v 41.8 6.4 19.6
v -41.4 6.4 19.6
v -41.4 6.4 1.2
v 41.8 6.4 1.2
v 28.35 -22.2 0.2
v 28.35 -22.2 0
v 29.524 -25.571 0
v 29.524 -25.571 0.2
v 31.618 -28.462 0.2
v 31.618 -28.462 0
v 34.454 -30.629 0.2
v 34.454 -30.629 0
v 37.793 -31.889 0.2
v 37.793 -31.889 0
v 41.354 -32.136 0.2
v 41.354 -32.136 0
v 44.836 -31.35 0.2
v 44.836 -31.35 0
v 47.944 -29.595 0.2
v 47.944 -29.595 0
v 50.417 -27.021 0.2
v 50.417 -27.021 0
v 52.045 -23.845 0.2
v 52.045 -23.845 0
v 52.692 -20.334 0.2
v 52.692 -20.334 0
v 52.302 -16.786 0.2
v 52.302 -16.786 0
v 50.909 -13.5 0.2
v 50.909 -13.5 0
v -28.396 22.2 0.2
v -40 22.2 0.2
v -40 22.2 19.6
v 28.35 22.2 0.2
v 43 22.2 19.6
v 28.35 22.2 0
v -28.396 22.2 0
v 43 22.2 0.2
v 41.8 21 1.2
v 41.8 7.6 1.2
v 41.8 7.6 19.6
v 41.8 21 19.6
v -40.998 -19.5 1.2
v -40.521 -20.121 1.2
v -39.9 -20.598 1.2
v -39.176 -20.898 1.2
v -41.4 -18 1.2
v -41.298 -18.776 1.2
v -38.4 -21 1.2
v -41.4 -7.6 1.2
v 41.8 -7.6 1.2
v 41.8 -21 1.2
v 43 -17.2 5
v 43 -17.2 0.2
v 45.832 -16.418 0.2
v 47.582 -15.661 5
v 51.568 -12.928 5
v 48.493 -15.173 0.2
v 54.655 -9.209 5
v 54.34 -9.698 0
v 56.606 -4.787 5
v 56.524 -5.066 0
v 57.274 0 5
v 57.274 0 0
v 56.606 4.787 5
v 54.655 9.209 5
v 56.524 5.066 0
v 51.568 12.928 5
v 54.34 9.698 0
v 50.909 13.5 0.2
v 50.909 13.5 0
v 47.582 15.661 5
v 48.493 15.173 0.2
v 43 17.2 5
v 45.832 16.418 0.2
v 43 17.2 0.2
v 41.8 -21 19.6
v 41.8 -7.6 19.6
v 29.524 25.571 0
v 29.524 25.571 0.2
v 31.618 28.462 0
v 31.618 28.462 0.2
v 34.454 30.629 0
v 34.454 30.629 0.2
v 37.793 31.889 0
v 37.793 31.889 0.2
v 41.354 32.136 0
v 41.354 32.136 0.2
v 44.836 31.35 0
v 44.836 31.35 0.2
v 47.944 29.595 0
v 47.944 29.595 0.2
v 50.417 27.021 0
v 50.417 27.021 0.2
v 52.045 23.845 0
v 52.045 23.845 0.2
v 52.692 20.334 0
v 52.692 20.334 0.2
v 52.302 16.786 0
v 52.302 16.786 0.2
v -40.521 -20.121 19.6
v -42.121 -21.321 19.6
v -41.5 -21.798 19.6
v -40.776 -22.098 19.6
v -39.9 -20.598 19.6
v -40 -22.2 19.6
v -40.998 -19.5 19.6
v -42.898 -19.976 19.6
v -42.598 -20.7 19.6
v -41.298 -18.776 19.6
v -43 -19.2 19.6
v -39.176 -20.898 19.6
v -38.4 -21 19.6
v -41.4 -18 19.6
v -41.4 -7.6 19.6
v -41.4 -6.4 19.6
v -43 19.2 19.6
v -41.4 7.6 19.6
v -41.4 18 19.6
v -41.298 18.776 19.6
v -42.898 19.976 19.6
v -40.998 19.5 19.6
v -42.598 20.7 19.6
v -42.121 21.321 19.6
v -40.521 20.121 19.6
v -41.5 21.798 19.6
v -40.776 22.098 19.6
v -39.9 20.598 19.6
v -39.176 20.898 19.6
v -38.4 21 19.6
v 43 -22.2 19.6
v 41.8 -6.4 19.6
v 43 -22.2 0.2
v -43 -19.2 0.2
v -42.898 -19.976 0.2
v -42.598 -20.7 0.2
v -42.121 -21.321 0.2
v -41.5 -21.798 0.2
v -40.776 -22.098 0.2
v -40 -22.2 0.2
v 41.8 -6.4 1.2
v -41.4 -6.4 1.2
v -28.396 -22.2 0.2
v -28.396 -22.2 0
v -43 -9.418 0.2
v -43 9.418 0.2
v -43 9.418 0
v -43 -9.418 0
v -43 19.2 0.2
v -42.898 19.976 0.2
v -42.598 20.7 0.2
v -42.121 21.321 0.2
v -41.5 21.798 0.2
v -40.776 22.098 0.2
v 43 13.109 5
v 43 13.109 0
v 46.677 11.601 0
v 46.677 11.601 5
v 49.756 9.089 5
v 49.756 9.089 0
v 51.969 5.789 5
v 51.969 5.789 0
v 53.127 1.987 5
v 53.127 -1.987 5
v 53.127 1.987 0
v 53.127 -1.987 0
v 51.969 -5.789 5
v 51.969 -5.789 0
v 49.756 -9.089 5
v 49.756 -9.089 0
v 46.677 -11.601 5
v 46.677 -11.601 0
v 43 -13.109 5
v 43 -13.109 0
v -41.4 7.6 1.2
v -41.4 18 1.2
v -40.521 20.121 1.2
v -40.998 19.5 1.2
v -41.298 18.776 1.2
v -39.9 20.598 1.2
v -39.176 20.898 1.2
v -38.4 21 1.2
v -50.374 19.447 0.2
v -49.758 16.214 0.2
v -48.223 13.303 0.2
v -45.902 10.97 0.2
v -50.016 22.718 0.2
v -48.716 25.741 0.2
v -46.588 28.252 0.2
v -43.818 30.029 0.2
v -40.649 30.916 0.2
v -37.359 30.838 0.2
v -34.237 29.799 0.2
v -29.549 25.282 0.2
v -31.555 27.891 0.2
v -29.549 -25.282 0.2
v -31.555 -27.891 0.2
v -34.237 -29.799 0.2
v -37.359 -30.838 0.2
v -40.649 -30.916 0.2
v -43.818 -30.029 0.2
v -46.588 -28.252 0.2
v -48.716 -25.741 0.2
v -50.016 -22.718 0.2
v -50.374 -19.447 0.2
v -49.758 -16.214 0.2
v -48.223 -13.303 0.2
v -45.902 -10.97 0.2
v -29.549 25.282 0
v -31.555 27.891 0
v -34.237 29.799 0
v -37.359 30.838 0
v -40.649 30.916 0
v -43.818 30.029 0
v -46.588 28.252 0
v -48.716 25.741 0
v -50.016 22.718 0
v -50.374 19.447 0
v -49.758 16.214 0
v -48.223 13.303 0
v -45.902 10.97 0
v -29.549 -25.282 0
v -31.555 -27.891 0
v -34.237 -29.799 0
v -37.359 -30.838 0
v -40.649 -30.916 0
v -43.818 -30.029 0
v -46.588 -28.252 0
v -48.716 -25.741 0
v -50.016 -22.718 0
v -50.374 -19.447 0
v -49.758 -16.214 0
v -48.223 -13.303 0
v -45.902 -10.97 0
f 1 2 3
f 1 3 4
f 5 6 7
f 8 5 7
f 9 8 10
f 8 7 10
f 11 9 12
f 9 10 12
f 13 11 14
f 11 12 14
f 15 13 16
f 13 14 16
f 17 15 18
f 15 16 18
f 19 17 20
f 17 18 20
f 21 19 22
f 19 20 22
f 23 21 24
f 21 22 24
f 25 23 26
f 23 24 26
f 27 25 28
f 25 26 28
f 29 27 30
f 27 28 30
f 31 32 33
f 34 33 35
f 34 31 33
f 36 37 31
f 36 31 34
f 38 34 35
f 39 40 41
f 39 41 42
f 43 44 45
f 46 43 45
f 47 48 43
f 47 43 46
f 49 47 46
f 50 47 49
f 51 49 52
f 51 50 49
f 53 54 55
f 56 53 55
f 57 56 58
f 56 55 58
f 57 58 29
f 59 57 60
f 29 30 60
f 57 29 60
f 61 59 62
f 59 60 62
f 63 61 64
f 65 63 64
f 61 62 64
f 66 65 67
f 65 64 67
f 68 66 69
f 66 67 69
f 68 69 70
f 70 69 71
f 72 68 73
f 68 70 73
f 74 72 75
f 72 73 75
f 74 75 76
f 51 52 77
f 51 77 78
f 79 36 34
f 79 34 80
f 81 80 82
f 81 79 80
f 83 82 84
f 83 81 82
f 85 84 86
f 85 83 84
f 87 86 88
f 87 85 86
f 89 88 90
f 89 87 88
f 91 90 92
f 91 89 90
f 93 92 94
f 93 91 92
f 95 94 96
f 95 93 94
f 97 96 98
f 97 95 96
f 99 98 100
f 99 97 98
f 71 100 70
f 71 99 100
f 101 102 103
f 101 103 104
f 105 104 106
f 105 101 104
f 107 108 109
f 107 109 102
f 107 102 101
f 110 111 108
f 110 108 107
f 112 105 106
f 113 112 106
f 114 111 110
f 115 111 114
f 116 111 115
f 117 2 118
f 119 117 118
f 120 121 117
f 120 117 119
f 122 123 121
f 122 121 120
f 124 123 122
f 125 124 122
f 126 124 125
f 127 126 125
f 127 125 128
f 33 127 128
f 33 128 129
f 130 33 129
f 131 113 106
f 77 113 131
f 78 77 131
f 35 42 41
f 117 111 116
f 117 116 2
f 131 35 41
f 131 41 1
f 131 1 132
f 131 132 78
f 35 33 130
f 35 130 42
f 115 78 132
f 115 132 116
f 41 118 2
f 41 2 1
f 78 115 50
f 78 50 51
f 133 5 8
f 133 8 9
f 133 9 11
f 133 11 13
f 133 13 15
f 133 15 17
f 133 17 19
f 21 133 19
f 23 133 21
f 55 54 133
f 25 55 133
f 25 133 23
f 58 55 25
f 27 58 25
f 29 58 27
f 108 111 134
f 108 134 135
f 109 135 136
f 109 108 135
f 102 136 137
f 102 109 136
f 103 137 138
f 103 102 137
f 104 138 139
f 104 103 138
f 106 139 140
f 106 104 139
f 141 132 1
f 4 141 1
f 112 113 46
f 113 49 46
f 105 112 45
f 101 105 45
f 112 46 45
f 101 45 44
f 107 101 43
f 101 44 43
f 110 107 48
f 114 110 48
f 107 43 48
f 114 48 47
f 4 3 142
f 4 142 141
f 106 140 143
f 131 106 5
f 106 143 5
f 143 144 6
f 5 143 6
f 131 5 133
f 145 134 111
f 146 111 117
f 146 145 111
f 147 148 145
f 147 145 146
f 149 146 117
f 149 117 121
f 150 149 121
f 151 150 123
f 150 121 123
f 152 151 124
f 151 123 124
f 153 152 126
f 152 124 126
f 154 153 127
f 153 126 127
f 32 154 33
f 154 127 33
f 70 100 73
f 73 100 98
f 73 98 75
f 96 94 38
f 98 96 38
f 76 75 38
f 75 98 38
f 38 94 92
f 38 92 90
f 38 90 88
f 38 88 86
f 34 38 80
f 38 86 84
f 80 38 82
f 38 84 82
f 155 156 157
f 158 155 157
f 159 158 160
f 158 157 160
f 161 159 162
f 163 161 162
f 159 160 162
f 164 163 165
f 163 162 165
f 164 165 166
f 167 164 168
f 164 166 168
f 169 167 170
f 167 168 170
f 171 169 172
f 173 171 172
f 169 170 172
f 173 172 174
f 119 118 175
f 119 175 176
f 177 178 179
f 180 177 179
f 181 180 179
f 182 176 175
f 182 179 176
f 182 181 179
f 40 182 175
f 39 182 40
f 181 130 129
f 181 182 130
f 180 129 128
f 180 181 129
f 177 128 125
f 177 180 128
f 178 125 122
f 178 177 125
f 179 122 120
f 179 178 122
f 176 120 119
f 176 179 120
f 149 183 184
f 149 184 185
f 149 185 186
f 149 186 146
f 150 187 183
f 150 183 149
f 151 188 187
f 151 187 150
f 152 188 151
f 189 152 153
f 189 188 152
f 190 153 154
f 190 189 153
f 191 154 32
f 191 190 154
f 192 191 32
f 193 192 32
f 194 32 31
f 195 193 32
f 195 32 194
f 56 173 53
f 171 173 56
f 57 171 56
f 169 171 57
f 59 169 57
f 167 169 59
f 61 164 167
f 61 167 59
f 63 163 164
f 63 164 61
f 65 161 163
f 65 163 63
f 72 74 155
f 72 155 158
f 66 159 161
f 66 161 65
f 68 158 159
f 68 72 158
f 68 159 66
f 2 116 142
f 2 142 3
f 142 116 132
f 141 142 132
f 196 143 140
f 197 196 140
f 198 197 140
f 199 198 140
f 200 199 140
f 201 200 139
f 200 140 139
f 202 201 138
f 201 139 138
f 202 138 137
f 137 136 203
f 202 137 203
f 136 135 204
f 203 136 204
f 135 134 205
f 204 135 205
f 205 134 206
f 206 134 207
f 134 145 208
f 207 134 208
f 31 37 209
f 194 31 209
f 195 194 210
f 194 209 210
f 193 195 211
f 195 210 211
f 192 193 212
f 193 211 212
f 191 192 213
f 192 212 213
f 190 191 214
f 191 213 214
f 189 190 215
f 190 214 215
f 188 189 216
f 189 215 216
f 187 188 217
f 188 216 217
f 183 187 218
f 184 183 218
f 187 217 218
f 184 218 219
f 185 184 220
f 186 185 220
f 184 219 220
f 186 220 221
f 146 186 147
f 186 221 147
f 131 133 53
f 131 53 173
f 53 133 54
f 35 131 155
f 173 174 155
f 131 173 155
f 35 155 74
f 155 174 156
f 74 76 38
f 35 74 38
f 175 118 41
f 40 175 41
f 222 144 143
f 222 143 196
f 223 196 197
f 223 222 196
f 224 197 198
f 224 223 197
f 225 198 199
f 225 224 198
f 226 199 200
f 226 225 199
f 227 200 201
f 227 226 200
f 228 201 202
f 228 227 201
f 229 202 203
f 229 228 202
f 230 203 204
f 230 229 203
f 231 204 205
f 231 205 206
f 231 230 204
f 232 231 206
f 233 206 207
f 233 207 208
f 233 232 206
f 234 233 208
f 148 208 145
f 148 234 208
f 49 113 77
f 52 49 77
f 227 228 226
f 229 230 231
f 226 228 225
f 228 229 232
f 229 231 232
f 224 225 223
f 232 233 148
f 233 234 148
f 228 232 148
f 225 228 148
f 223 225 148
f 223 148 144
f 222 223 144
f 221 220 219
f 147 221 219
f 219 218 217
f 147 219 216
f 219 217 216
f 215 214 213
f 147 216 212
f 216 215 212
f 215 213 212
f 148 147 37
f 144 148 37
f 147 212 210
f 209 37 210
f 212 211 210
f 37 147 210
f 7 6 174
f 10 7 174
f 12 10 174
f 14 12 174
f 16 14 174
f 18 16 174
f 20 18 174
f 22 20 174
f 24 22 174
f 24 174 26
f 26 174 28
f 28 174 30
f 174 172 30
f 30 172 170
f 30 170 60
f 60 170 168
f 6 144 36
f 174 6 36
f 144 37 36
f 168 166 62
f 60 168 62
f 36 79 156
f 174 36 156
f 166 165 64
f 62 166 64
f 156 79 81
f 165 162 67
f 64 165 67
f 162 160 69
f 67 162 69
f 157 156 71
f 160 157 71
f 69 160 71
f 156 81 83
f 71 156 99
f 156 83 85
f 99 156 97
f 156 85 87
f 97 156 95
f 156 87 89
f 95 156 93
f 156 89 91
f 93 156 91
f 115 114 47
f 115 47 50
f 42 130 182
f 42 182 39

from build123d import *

# Parameters (mm, degrees)
SKETCH_1_W          = 86
SKETCH_1_H          = 44.4
EXTRUDE_1_DEPTH     = 19.6
EXTRUDE_2_DEPTH     = 5
SKETCH_3_W          = 83.2
SKETCH_3_H          = 13.4
SKETCH_3_H_2        = 12.8
CUT_EXTRUDE_1_DEPTH = 18.4
FILLET_1_R          = 3
EXTRUDE_3_DEPTH     = 0.2


with BuildPart() as part:
    # Эскиз1 → Бобышка-Вытянуть1 (new body)
    with BuildSketch(Plane.XY):
        Rectangle(SKETCH_1_W, SKETCH_1_H)
    extrude(amount=EXTRUDE_1_DEPTH)

    # Эскиз2 → Бобышка-Вытянуть2 (add)
    with BuildSketch(Plane.XY):
        with BuildLine():
            Line((43, 17.2), (43, 13.108775687))
            ThreePointArc((43, 13.108775687), (53.273546839, 0), (43, -13.108775687))
            Line((43, -13.108775687), (43, -17.2))
            ThreePointArc((43, -17.2), (57.273546839, 0), (43, 17.2))
        make_face()
    extrude(amount=EXTRUDE_2_DEPTH)

    # Эскиз3 → Вырез-Вытянуть1 (cut)
    with BuildSketch(Plane.XY.offset(19.6)):
        with Locations((0.2, 14.3)):
            Rectangle(SKETCH_3_W, SKETCH_3_H)
        with Locations((0.2, 0)):
            Rectangle(SKETCH_3_W, SKETCH_3_H_2)
        with Locations((0.2, -14.3)):
            Rectangle(SKETCH_3_W, SKETCH_3_H)
    extrude(amount=-CUT_EXTRUDE_1_DEPTH, mode=Mode.SUBTRACT)

    # Скругление1
    fillet_1_edges = [part.edges().sort_by_distance(p)[0] for p in [
        (-41.4, 21, 10.4),
        (-41.4, -21, 10.4),
        (-43, -22.2, 9.8),
        (-43, 22.2, 9.8),
    ]]
    fillet(fillet_1_edges, radius=FILLET_1_R)

    # Эскиз4 → Бобышка-Вытянуть3 (add)
    with BuildSketch(Plane(origin=(0, 0, 0), x_dir=(-1, 0, 0), z_dir=(0, 0, -1))):
        with BuildLine():
            Line((-50.908934574, 13.500116296), (-28.350220542, 22.2))
            ThreePointArc((-28.350220542, 22.2), (-44.835714922, 31.349521818), (-50.908934574, 13.500116296))
        make_face()
        with BuildLine():
            Line((43, 9.417902962), (28.395750511, 22.2))
            ThreePointArc((28.395750511, 22.2), (46.588074999, 28.251604167), (43, 9.417902962))
        make_face()
        with BuildLine():
            Line((43, -9.417902962), (28.395750511, -22.2))
            ThreePointArc((28.395750511, -22.2), (46.588074999, -28.251604167), (43, -9.417902962))
        make_face()
        with BuildLine():
            Line((-50.908934574, -13.500116296), (-28.350220542, -22.2))
            ThreePointArc((-28.350220542, -22.2), (-44.835714922, -31.349521818), (-50.908934574, -13.500116296))
        make_face()
    extrude(amount=-EXTRUDE_3_DEPTH)


solid = part.part
